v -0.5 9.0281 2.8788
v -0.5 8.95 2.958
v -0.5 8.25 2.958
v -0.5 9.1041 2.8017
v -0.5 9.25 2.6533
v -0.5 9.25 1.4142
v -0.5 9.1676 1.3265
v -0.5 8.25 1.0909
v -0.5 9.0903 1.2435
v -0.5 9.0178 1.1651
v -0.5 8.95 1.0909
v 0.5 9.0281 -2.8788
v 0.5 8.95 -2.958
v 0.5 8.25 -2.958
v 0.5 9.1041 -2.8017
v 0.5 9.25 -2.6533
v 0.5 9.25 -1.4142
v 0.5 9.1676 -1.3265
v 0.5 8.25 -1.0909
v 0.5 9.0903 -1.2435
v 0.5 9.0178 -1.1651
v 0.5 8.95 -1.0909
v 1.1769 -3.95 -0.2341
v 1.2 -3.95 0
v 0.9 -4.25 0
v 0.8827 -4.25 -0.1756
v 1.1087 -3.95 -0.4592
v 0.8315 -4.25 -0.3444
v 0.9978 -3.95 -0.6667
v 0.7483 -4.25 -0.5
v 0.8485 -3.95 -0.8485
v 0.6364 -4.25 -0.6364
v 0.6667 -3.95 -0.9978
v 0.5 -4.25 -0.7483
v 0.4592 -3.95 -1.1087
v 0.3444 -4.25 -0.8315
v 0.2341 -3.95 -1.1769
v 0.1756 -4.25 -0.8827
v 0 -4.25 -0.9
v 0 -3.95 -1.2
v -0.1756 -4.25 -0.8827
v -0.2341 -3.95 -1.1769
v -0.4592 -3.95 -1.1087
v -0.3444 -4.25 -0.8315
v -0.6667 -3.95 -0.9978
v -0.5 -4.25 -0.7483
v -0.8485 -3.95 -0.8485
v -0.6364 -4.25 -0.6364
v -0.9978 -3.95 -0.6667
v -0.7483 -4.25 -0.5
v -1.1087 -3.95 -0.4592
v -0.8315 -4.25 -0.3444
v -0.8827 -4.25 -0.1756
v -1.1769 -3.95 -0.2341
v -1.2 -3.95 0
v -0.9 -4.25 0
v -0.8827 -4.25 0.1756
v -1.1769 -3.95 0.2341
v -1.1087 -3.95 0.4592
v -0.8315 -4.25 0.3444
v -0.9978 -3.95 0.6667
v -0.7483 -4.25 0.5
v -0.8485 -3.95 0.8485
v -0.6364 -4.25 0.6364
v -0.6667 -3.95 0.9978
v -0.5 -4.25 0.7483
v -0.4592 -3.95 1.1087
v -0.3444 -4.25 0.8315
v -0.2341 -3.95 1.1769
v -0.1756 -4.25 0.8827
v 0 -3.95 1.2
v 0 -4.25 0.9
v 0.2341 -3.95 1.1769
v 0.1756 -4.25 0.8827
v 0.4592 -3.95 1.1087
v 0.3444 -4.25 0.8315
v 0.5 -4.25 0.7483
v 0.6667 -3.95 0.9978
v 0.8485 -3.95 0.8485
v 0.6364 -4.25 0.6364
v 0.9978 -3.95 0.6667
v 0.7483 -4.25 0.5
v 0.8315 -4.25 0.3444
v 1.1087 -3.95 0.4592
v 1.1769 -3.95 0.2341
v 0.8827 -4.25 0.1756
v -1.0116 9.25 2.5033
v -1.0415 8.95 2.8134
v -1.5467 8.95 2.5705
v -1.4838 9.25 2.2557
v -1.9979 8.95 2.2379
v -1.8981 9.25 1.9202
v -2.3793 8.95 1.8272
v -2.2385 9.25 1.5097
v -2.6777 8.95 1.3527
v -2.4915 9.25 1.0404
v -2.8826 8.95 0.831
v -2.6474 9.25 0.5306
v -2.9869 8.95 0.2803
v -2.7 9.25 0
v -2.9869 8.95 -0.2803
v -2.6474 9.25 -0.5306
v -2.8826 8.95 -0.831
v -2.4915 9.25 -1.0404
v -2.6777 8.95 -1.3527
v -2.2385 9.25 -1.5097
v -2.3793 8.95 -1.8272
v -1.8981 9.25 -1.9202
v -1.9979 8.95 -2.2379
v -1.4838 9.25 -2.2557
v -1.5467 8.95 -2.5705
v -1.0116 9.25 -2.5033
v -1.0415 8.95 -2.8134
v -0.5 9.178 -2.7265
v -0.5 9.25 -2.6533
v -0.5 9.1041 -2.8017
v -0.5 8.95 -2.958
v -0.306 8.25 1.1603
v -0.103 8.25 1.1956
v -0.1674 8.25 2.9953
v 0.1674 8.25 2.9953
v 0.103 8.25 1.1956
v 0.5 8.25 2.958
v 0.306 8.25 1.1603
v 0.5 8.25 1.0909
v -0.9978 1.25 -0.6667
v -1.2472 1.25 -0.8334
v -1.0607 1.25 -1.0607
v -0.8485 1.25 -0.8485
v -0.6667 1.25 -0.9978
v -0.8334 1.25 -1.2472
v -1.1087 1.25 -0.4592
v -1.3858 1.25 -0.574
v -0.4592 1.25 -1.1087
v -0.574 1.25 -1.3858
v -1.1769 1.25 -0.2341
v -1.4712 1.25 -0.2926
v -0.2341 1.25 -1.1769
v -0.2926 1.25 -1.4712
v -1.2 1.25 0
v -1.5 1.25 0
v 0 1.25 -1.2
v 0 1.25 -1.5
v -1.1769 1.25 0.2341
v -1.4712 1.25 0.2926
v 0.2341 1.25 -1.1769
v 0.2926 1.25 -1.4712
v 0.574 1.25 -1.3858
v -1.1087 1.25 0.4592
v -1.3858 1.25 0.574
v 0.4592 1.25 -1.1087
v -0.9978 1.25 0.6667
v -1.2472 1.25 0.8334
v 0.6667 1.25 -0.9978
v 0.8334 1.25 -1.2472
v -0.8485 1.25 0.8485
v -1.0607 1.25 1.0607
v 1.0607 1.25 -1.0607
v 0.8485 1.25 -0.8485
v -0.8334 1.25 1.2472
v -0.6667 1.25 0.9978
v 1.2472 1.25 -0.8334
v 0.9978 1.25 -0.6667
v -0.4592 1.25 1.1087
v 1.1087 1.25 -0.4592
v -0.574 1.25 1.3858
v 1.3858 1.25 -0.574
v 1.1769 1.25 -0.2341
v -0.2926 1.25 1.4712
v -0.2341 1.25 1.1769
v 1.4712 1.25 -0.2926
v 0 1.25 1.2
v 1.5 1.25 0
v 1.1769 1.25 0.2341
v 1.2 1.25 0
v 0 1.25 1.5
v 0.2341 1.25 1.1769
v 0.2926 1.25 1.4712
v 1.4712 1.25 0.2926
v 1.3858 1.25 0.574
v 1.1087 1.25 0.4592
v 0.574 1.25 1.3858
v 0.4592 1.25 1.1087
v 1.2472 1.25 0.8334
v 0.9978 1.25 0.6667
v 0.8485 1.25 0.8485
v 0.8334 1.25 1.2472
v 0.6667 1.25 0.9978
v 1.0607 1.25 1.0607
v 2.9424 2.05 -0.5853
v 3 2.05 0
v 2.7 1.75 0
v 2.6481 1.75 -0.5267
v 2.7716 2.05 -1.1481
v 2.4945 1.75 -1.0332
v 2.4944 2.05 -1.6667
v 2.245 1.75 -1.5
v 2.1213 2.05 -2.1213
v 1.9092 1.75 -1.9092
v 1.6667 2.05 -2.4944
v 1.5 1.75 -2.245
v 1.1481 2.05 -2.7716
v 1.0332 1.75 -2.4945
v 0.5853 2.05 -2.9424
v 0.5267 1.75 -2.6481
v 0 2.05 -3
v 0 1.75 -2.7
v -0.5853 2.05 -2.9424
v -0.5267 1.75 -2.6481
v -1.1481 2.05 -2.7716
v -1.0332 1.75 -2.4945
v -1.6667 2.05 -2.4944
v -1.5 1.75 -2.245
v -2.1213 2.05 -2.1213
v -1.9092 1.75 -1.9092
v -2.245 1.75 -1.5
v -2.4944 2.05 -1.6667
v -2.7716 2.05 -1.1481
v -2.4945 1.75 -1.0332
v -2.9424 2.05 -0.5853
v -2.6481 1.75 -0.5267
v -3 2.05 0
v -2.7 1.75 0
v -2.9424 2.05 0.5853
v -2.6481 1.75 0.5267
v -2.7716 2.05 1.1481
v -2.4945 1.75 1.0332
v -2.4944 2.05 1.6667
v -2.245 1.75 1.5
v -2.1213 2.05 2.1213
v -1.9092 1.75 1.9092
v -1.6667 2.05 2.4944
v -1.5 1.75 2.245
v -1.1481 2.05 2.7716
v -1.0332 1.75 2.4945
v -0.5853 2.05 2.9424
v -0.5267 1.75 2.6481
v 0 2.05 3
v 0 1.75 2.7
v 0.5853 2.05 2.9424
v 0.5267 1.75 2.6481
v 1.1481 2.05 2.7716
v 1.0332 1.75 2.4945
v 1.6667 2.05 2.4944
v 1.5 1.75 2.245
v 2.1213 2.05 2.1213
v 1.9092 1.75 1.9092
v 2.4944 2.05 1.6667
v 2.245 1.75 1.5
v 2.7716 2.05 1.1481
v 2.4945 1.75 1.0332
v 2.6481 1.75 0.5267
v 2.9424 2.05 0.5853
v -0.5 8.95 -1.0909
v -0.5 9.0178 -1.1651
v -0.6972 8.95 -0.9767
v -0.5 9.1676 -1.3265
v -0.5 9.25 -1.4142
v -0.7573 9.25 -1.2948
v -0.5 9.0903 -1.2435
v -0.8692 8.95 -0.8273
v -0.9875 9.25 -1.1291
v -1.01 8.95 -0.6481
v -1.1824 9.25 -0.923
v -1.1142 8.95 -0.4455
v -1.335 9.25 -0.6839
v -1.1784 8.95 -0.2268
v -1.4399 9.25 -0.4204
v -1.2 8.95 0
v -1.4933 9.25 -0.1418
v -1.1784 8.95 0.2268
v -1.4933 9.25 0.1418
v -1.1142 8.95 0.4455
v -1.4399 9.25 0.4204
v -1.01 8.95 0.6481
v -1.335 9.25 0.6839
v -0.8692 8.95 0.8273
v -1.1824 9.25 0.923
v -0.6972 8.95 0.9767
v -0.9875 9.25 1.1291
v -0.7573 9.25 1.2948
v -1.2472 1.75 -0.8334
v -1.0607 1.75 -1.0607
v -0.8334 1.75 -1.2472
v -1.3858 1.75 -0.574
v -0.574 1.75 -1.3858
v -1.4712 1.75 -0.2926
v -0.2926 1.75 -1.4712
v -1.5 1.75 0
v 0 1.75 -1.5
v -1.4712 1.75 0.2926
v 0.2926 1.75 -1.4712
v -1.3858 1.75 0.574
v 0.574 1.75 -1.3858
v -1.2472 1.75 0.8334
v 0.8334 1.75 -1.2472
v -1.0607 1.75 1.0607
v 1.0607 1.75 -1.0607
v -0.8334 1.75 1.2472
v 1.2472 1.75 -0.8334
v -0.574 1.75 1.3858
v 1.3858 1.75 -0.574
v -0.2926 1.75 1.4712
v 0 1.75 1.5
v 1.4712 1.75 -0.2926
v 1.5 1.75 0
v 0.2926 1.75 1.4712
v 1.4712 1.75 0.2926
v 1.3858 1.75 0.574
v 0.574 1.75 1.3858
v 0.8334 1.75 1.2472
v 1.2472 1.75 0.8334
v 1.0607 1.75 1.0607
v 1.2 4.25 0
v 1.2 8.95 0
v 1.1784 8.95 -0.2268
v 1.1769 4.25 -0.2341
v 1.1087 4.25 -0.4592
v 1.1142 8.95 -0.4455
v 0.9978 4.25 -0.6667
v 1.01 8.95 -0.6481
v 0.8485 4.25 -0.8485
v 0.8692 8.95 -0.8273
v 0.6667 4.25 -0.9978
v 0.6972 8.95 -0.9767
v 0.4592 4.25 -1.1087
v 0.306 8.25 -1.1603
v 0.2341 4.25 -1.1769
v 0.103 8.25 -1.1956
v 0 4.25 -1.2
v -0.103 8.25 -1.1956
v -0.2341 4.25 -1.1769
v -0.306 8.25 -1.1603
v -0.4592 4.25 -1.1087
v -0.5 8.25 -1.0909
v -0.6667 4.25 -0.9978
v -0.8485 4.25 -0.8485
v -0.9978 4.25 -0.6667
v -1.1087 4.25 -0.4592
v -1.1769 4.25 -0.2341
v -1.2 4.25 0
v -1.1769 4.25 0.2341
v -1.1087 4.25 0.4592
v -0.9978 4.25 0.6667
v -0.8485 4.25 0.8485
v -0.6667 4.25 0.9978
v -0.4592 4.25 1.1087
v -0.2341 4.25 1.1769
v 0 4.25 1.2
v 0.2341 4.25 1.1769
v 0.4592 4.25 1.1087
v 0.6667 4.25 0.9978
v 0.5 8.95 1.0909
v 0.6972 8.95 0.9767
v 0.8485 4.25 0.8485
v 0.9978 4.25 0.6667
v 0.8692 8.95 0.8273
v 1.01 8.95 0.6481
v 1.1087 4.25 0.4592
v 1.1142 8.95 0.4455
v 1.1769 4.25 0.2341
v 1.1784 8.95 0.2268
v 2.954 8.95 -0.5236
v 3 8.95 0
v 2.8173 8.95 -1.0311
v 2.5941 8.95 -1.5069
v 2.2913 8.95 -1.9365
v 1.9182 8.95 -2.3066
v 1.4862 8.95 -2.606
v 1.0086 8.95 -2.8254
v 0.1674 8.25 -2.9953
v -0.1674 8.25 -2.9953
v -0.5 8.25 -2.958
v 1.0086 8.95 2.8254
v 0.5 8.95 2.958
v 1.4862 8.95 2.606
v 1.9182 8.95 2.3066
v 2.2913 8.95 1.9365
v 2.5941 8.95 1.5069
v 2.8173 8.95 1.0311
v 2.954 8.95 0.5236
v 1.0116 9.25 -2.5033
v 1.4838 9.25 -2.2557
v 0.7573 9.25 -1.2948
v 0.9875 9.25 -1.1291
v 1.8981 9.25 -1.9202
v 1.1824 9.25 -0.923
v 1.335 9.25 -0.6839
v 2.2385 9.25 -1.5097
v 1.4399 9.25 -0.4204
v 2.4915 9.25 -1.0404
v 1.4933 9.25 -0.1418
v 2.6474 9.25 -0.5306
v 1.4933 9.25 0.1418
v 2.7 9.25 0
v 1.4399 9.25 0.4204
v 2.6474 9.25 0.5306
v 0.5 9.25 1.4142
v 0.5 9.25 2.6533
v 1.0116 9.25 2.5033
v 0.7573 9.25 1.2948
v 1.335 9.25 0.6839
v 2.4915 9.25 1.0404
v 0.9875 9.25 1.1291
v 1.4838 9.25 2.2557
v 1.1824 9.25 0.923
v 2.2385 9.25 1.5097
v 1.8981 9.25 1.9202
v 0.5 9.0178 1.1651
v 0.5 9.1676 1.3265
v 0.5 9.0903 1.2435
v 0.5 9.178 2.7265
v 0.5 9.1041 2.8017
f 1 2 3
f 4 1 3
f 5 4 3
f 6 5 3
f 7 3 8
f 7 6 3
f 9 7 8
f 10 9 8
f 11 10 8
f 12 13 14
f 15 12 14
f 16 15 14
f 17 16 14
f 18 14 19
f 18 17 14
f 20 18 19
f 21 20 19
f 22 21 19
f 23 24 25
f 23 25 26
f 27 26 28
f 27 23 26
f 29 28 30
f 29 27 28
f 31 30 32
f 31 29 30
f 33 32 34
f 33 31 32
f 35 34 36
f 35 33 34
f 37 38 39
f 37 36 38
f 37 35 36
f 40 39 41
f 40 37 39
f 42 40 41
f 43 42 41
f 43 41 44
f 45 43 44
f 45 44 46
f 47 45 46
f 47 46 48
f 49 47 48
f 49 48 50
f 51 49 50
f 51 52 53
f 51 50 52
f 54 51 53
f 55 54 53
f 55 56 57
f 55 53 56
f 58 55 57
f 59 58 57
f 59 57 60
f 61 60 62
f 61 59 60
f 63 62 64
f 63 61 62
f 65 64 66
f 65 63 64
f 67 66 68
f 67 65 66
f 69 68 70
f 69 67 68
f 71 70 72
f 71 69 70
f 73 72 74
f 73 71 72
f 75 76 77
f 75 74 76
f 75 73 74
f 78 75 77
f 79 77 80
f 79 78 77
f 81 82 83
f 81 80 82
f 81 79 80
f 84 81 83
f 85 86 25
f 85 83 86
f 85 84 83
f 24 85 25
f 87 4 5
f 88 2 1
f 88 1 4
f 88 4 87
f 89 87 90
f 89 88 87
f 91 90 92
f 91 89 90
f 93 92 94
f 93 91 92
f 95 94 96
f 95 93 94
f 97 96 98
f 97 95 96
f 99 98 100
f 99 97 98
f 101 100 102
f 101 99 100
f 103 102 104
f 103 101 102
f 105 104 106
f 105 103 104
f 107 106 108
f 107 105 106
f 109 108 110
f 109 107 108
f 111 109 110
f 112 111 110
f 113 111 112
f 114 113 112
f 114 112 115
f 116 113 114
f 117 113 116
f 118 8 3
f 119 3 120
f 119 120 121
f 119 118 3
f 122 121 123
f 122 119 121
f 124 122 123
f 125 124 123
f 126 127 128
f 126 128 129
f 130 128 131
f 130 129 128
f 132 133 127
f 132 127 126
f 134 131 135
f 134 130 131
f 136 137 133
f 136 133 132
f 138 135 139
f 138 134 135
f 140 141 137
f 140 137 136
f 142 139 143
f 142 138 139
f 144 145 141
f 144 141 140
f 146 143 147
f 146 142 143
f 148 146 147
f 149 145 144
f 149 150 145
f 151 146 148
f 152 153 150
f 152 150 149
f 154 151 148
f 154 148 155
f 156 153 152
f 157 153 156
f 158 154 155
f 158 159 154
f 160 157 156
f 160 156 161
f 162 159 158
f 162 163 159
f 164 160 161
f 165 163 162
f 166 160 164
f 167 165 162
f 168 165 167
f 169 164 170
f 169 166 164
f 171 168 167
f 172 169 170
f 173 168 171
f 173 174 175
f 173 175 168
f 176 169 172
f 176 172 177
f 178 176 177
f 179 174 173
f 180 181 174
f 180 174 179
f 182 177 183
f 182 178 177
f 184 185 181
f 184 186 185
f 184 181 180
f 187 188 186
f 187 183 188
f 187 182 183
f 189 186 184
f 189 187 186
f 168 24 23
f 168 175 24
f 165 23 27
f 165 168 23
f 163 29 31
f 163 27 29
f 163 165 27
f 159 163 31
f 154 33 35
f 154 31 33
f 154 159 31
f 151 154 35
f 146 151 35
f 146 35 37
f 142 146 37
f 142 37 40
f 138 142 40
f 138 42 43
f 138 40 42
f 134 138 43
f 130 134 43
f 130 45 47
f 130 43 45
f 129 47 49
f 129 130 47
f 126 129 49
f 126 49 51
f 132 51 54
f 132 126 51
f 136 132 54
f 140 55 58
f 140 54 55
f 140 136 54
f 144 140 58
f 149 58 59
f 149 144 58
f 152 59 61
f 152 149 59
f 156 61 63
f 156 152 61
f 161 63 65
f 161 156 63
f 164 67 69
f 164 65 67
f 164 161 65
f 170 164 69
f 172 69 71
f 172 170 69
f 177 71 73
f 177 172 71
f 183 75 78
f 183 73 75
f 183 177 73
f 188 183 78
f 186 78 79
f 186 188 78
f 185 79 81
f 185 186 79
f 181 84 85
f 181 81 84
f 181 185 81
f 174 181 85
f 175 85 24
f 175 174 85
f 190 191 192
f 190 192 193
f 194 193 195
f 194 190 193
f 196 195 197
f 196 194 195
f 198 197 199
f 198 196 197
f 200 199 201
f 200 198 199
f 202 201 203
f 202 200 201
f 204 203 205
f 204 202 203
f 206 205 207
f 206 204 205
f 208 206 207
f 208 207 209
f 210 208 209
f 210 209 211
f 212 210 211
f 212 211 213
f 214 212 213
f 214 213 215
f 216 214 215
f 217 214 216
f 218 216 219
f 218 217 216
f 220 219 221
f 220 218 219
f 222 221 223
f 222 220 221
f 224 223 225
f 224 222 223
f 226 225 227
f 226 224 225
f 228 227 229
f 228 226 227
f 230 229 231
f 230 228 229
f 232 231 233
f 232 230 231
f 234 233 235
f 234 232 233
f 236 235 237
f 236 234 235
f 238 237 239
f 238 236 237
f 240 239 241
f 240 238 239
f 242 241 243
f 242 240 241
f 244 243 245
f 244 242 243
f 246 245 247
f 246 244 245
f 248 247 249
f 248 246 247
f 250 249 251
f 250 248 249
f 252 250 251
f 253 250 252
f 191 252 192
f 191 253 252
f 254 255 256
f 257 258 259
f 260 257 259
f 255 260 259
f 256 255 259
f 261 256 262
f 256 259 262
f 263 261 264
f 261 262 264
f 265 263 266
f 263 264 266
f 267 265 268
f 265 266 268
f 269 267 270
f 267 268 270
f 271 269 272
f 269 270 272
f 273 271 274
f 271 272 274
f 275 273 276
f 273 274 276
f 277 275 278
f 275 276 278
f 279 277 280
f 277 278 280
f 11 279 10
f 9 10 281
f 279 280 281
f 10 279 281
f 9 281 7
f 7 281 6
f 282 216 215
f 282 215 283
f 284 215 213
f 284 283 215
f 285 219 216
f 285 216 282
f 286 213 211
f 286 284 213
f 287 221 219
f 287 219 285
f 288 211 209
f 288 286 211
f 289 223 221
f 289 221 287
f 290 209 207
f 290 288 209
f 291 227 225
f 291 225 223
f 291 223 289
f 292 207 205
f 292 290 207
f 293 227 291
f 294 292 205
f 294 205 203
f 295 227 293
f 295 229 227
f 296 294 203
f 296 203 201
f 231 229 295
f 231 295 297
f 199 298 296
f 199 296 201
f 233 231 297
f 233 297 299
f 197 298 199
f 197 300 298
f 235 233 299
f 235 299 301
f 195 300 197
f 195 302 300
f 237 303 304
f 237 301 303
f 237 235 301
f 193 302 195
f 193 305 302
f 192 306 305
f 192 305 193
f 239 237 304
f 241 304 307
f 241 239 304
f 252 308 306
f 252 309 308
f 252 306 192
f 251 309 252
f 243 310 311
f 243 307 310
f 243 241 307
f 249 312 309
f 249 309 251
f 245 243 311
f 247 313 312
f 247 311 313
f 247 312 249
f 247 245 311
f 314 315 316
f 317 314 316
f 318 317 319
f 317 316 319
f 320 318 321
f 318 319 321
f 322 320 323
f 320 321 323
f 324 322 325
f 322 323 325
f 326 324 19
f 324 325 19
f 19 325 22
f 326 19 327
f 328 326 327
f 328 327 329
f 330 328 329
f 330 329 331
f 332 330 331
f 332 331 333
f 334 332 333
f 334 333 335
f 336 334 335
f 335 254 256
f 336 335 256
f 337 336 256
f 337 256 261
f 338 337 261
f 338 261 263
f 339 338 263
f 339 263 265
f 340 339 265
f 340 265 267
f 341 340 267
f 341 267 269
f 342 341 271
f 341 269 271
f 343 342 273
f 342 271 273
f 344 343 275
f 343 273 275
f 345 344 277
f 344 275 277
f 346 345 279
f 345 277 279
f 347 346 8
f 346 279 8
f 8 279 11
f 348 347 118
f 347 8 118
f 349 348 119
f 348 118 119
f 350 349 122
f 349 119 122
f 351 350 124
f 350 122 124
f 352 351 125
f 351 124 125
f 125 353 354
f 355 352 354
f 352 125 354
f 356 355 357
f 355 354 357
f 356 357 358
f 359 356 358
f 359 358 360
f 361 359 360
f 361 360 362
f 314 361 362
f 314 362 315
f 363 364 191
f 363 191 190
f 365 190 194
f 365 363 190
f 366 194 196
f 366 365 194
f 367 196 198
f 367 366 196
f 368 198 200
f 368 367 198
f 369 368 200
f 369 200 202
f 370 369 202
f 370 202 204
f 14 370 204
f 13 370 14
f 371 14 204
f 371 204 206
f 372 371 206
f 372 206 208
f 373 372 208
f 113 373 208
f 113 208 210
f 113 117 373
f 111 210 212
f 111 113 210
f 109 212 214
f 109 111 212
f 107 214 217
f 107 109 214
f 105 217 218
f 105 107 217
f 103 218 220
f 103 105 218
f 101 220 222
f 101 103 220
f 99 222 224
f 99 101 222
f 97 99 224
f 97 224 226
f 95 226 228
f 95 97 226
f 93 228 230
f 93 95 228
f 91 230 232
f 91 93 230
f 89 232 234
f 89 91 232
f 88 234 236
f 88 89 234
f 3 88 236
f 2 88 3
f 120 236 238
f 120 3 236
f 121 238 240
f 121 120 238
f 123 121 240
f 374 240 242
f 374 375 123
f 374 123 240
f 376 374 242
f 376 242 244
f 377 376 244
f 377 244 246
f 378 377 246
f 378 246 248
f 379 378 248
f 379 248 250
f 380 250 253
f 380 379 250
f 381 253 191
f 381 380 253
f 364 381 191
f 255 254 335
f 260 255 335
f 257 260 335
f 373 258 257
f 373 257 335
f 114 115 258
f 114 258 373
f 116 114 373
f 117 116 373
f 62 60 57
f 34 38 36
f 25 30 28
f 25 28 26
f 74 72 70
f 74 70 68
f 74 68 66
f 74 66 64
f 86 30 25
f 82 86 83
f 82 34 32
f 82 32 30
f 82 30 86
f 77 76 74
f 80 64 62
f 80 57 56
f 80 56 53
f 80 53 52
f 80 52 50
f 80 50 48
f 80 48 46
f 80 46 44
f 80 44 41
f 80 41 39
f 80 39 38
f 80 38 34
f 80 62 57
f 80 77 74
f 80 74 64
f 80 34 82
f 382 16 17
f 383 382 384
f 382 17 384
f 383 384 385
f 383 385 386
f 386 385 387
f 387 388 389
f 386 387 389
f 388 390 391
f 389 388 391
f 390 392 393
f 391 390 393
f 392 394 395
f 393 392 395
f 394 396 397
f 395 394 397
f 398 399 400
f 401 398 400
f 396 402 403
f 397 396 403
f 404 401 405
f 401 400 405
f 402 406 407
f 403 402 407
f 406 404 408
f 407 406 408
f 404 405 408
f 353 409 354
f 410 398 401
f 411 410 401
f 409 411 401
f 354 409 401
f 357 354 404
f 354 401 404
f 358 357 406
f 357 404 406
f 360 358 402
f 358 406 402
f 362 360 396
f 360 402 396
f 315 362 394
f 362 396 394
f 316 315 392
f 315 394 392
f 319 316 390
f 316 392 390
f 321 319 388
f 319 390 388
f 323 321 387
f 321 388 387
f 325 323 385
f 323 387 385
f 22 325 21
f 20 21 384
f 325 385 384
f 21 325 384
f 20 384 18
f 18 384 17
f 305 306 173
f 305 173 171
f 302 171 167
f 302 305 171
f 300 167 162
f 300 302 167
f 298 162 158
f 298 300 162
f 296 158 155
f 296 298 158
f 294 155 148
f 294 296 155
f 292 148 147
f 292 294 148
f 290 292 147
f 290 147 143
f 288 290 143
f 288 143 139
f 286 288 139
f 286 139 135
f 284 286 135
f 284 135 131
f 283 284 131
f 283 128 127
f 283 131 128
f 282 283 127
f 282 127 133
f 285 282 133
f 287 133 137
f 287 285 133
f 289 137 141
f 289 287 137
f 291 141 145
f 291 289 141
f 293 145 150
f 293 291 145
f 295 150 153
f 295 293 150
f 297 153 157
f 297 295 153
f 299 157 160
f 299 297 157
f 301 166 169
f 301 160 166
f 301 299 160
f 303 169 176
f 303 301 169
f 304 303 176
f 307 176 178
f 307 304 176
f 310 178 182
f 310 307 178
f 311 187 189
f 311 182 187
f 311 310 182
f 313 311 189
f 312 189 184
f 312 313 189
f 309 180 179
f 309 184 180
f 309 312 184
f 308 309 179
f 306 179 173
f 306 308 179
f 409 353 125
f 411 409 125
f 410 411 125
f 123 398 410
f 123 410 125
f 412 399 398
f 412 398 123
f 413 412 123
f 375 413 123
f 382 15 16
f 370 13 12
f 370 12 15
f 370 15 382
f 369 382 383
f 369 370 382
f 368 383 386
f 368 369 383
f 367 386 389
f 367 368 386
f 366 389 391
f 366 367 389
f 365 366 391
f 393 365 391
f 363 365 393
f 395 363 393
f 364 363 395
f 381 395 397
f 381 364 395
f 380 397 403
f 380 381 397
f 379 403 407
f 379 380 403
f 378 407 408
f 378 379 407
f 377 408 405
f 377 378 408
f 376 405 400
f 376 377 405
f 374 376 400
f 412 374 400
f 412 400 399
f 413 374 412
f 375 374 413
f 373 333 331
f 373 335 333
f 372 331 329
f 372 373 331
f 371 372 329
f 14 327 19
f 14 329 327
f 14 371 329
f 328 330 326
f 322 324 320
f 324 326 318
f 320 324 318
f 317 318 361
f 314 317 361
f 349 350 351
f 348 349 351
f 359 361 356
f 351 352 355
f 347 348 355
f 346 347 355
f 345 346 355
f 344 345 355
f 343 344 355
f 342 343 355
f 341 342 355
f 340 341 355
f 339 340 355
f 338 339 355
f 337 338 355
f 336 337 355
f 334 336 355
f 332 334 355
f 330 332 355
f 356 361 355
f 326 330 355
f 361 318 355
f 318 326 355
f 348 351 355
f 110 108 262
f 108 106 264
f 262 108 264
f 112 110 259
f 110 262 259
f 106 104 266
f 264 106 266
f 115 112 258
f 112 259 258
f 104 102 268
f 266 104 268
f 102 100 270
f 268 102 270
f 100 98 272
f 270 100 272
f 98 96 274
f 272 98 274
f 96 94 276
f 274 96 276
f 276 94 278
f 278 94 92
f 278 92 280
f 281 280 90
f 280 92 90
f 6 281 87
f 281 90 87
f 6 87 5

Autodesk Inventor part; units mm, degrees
ref_plane "YZ Plane" through (0, 0, 0) normal (1, 0, 0) x (0, 1, 0)
ref_plane "XZ Plane" through (0, 0, 0) normal (0, 1, 0) x (-1, 0, 0)
ref_plane "XY Plane" through (0, 0, 0) normal (0, 0, 1) x (1, 0, 0)
sketch "スケッチ1" plane through (0, 0, 0) normal (0, 0, 1) x (1, 0, 0)
  line L0 (0, -4.25) -> (0.9, -4.25)
  line L1 (0.9, -4.25) -> (1.2, -3.95)
  line L2 (1.2, -3.95) -> (1.2, 1.25)
  line L3 (1.2, 1.25) -> (1.5, 1.25)
  line L4 (1.5, 1.25) -> (1.5, 1.75)
  line L5 (1.5, 1.75) -> (2.7, 1.75)
  line L6 (3, 8.95) -> (2.7, 9.25)
  line L7 (2.7, 9.25) -> (1.5, 9.25)
  line L8 (1.5, 9.25) -> (1.2, 8.95)
  line L9 (0, 7.4044) -> (0, -7.4044) construction
  line L10 (0, -4.25) -> (0, 4.25)
  line L11 (0, 4.25) -> (1.2, 4.25)
  line L12 (1.2, 4.25) -> (1.2, 8.95)
  line L13 (2.7, 1.75) -> (3, 2.05)
  line L14 (3, 2.05) -> (3, 8.95)
  point P0 (0, 0)
  point P1 (0, 0)
  point P2 (0, 0)
  dimension "d0" = 2.4
  dimension "d1" = 6
  dimension "d2" = 0.3
  dimension "d3" = 0.3
  dimension "d4" = 3
  dimension "d5" = 0.5
  dimension "d6" = 7.5
  dimension "d7" = 0.3
  dimension "d8" = 2.4
  dimension "d9" = 5
  dimension "d10" = 0.3
  dimension "d11" = 0.3
  dimension "d12" = 0.3
  dimension "d13" = 0.3
  dimension "d14" = 6
revolve "回転1" add sketch "スケッチ1" angle 360 about axis through (0, 7.4044, 0) along (0, -1, 0)
sketch "スケッチ2" plane through (0, 9.25, 0) normal (0, 1, 0) x (1, 0, 0)
  line L0 (-0.5, 3) -> (0.5, 3)
  line L1 (0.5, 3) -> (0.5, -3)
  line L2 (0.5, -3) -> (-0.5, -3)
  line L3 (-0.5, -3) -> (-0.5, 3)
  line L4 (-0.5, 3) -> (0.5, -3) construction
  line L5 (0.5, 3) -> (-0.5, -3) construction
  circle A0 centre (0, 0) radius 3 projected
  point P0 (0, 0)
  point P1 (0.5, 2.958)
  point P2 (-0.5, 2.958)
  point P3 (-0.5, -2.958)
  point P4 (0.5, -2.958)
  dimension "d16" = 1
extrude "押し出し1" cut sketch "スケッチ2" against normal blind 1 contours A0 L1 L3
equation "\"d3\" = d2"
equation "\"d10\" = d7"
equation "\"d11\" = d7"
equation "\"d12\" = d11"
equation "\"d13\" = d12"
properties part number "BRU-307_5S" material "ステンレス鋼 AISI 304"
